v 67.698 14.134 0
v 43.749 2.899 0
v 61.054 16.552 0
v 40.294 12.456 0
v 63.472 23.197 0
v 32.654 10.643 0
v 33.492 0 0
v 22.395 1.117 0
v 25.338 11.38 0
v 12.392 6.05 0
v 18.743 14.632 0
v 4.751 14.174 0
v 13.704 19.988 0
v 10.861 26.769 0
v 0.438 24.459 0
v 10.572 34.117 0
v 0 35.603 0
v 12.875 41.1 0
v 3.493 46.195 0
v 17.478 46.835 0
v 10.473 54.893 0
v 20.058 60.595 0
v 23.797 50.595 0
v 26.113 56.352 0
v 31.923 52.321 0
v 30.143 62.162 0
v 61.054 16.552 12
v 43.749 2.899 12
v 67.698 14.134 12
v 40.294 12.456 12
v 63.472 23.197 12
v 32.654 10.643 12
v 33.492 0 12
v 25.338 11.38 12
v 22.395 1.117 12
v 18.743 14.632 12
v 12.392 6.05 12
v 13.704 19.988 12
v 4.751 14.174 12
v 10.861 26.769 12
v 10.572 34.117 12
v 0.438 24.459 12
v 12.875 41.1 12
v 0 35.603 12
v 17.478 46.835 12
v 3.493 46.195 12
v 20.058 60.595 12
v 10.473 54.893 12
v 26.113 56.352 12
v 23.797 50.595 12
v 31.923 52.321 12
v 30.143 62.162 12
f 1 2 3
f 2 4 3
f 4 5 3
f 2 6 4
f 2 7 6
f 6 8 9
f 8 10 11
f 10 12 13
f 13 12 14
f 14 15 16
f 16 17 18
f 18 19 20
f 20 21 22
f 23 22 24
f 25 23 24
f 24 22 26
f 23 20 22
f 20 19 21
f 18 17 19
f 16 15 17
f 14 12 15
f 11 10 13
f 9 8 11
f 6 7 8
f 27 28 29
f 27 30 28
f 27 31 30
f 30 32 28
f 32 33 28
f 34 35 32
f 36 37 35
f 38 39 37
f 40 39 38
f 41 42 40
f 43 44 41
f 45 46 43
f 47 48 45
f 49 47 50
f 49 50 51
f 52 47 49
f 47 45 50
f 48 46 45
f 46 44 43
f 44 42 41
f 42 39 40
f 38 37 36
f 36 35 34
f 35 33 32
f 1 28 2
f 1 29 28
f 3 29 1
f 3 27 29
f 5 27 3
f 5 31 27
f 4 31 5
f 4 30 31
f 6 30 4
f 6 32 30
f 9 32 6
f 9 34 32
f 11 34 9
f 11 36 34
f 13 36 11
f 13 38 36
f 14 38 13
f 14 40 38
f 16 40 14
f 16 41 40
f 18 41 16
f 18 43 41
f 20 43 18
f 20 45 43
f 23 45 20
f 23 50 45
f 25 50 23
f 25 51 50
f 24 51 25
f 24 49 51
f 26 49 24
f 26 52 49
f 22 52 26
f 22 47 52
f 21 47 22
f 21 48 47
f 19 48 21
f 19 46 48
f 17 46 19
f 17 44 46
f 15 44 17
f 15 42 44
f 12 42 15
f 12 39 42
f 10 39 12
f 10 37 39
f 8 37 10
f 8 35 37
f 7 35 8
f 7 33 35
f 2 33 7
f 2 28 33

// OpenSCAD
$fn = 32;

// ----------------------------------------------------------------------
// Hook plate: curl radius 26 mm over 205 degrees, 10 mm thick band
// ----------------------------------------------------------------------

// --- parameters (mm) ---
profile_height = 12;      // extrusion height
profile_points = 26;      // points of the closed outline

profile = [[26.113, 56.352], [30.143, 62.162], [20.058, 60.595], [10.473, 54.893], [3.493, 46.195], [0, 35.603], [0.438, 24.459], [4.751, 14.174], [12.392, 6.05], [22.395, 1.117], [33.492, 0], [43.749, 2.899], [67.698, 14.134], [61.054, 16.552], [63.472, 23.197], [40.294, 12.456], [32.654, 10.643], [25.338, 11.38], [18.743, 14.632], [13.704, 19.988], [10.861, 26.769], [10.572, 34.117], [12.875, 41.1], [17.478, 46.835], [23.797, 50.595], [31.923, 52.321]];  // single closed polygon, 26 points, counter clockwise

// --- the one profile operation ---
linear_extrude(height = profile_height) polygon(points = profile);
